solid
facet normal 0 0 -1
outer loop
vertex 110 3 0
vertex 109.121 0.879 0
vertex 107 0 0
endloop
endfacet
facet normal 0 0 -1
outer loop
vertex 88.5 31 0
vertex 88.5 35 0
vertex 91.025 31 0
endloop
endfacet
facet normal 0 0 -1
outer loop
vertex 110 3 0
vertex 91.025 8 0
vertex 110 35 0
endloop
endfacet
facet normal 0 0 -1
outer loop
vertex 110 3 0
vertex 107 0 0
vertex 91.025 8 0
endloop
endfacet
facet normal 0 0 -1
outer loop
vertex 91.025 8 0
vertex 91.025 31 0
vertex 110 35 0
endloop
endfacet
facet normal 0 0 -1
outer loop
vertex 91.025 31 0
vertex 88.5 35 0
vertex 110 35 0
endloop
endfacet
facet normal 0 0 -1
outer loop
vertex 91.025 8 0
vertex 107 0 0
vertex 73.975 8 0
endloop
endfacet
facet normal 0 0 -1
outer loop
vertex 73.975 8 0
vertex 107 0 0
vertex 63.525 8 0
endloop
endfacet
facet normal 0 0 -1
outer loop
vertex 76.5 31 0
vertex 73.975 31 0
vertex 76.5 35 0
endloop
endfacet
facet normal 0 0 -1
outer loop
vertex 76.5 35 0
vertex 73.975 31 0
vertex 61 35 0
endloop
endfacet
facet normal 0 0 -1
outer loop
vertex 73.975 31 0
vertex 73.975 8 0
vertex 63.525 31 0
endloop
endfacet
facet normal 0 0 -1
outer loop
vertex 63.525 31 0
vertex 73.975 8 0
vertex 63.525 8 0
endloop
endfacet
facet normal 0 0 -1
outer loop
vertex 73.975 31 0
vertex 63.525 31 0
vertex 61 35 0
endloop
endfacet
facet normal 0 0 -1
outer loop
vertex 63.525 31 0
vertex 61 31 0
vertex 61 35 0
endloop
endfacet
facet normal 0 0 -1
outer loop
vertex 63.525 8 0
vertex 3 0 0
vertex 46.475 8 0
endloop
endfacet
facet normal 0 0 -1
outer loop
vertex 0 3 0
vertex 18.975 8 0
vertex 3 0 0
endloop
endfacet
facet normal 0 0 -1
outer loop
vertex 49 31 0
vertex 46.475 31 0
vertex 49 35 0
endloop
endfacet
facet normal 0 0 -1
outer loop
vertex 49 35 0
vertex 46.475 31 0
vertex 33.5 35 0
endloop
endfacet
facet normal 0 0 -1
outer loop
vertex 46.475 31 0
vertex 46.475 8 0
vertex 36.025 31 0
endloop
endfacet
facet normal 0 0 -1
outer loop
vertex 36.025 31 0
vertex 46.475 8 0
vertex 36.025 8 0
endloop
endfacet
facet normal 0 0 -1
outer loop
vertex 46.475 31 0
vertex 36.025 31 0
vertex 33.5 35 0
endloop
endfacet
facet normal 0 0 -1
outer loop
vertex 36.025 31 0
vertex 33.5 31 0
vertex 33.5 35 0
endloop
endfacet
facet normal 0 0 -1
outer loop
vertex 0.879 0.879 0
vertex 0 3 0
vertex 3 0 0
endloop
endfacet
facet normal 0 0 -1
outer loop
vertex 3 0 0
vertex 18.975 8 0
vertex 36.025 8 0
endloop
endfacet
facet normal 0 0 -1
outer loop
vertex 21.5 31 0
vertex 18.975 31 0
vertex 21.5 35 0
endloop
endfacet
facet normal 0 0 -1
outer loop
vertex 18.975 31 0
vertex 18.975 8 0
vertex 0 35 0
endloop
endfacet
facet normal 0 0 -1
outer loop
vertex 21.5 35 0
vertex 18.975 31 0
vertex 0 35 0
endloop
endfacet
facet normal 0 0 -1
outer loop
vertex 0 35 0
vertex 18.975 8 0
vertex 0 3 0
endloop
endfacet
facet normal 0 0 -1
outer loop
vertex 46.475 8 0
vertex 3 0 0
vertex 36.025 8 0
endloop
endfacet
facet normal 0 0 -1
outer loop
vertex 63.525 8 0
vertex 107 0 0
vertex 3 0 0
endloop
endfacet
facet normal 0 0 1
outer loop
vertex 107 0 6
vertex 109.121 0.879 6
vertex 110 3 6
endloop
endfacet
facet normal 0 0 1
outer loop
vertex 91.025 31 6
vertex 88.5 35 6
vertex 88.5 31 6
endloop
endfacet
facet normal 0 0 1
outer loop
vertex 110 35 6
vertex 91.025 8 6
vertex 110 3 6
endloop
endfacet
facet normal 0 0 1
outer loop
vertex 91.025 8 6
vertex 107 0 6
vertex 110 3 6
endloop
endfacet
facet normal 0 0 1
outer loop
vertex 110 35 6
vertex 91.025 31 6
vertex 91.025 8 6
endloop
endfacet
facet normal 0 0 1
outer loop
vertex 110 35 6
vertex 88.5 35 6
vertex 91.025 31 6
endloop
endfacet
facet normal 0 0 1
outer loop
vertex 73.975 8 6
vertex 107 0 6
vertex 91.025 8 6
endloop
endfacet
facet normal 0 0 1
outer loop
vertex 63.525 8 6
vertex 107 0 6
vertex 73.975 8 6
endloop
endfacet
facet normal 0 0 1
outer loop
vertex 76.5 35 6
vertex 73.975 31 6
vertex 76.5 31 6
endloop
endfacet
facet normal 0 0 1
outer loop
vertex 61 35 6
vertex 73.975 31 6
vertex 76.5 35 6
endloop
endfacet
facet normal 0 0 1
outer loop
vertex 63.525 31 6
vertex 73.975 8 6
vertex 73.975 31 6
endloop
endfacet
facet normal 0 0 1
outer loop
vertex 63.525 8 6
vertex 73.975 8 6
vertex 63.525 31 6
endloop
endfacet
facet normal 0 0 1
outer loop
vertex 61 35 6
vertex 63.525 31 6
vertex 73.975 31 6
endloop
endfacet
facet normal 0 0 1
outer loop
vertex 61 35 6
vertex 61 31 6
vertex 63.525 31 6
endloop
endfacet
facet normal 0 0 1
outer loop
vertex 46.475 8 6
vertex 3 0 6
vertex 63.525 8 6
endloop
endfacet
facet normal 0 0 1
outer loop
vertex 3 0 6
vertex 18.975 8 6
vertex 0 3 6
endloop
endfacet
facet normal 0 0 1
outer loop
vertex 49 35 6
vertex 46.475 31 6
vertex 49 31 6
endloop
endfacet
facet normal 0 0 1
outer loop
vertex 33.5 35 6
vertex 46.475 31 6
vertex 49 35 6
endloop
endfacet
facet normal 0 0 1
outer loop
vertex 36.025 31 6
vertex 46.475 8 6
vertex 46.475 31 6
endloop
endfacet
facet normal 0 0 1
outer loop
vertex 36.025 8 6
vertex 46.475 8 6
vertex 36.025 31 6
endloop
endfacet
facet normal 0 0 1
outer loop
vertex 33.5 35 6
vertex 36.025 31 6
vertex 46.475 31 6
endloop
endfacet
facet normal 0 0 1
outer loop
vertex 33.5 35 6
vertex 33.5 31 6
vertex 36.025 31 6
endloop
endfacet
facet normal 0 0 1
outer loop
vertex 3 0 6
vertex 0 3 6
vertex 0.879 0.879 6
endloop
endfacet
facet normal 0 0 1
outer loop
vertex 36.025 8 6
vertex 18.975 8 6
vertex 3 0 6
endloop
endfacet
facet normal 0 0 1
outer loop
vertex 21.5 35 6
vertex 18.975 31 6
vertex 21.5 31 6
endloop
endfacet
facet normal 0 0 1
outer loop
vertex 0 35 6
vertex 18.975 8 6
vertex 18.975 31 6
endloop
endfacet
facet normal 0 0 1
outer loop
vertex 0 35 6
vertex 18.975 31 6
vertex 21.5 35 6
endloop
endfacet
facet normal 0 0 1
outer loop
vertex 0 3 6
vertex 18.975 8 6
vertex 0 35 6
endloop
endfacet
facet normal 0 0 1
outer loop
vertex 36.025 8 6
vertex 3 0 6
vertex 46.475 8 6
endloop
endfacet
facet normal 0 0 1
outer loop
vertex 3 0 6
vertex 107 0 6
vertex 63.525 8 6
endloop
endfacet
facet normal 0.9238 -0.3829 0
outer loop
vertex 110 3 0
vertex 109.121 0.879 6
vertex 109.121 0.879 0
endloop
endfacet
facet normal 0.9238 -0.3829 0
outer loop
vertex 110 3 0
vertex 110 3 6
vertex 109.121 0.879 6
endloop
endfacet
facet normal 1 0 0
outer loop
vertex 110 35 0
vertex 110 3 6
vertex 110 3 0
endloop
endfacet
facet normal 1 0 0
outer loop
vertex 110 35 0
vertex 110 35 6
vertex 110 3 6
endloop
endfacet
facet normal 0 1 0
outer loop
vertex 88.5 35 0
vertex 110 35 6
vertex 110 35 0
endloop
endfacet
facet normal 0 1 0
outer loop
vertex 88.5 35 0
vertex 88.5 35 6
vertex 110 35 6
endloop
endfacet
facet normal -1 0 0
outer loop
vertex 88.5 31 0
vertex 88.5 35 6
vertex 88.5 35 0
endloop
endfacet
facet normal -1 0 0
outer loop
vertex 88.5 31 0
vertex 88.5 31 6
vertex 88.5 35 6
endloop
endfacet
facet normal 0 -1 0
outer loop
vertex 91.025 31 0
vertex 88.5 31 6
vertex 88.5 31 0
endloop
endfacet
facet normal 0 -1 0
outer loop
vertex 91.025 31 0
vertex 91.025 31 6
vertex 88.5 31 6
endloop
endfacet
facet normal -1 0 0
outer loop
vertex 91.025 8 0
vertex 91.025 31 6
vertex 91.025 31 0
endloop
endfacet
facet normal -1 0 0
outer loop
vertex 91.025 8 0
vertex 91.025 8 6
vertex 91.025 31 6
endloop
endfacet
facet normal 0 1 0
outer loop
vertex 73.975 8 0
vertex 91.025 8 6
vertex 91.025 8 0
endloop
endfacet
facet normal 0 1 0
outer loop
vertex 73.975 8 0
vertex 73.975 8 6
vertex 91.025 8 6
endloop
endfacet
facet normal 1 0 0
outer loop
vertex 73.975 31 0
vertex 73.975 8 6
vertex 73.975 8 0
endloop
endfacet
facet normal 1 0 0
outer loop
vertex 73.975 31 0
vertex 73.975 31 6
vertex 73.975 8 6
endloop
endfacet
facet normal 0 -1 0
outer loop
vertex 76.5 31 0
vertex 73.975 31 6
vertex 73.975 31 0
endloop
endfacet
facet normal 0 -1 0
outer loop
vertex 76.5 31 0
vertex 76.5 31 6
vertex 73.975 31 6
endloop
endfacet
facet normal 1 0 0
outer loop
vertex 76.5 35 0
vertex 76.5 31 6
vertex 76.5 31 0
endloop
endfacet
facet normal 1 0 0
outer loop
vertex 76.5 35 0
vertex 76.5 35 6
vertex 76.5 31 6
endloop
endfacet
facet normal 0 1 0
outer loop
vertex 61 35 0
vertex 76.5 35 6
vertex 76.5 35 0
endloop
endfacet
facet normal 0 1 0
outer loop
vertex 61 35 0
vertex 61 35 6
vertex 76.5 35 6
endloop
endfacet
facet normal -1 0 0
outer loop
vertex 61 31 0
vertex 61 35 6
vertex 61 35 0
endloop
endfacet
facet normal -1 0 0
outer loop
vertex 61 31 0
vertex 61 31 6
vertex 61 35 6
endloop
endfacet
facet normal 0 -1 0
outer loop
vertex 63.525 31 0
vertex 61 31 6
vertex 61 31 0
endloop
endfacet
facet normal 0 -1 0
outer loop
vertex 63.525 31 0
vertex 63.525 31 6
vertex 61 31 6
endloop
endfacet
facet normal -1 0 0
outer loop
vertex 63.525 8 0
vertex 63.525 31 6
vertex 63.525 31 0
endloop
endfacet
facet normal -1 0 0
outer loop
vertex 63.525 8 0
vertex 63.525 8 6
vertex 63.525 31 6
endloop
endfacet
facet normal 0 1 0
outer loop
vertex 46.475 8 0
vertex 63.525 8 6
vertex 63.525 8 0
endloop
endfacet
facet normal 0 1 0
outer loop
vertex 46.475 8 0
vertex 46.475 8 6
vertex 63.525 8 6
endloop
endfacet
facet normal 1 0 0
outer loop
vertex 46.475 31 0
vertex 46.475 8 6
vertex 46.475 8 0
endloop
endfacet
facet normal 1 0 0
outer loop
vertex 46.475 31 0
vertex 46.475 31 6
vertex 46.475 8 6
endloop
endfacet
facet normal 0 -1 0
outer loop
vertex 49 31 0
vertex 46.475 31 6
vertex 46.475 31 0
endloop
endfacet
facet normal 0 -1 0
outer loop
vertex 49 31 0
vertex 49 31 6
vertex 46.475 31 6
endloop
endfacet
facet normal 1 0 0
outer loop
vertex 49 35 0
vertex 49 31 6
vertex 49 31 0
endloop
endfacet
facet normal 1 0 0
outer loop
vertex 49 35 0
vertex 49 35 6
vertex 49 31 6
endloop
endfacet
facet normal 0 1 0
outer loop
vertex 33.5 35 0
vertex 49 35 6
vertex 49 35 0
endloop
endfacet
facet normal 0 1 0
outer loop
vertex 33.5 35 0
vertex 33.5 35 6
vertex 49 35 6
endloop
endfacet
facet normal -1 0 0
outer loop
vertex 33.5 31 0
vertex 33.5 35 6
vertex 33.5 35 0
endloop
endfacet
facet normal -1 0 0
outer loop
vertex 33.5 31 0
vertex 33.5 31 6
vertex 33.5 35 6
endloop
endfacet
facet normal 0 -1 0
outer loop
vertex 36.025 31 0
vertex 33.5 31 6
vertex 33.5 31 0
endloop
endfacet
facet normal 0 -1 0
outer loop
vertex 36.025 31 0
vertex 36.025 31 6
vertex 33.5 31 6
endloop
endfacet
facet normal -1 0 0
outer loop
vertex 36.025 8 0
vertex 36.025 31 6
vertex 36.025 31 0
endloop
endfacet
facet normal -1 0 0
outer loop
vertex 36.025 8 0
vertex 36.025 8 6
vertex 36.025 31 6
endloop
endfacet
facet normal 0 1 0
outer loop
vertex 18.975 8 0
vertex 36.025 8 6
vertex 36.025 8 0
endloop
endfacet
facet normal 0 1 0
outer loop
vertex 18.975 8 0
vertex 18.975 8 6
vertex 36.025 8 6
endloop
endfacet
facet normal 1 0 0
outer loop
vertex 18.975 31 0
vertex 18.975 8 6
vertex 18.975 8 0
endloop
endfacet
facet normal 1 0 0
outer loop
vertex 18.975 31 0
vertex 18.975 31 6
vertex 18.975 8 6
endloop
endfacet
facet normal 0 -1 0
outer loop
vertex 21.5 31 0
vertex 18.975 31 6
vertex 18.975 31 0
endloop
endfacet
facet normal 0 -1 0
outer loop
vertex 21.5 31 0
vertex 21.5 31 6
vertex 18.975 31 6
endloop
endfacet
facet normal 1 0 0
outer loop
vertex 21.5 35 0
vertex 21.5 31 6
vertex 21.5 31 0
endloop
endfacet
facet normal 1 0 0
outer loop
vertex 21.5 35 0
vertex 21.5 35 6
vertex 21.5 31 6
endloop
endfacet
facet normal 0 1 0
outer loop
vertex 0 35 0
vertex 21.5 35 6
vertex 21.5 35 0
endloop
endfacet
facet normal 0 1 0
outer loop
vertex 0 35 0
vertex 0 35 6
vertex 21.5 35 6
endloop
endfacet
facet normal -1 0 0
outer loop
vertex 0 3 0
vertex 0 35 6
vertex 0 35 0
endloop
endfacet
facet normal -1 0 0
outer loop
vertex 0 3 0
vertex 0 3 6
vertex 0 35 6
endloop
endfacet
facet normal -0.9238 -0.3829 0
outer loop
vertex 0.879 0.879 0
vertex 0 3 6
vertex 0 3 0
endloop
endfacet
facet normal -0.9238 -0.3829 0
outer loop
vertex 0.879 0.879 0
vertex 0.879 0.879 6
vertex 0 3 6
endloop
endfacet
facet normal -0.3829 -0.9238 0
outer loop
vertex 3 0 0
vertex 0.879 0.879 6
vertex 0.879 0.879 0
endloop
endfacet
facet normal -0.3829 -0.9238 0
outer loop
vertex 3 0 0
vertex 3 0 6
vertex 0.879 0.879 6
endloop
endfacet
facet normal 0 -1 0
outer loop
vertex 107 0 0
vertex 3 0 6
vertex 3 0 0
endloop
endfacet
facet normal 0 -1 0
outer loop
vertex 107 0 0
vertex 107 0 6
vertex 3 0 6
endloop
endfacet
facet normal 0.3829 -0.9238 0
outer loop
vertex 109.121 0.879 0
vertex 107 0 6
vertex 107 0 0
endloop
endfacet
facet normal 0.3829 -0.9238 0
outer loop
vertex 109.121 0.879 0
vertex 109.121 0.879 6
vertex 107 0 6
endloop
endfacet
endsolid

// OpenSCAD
$fn = 32;

// ----------------------------------------------------------------------
// Window plate: 110 x 35 mm, 3 open windows
// ----------------------------------------------------------------------

// --- parameters (mm) ---
profile_height = 6;       // extrusion height
profile_points = 32;      // points of the closed outline

profile = [[0, 3], [0.879, 0.879], [3, 0], [107, 0], [109.121, 0.879], [110, 3], [110, 35], [88.5, 35], [88.5, 31], [91.025, 31], [91.025, 8], [73.975, 8], [73.975, 31], [76.5, 31], [76.5, 35], [61, 35], [61, 31], [63.525, 31], [63.525, 8], [46.475, 8], [46.475, 31], [49, 31], [49, 35], [33.5, 35], [33.5, 31], [36.025, 31], [36.025, 8], [18.975, 8], [18.975, 31], [21.5, 31], [21.5, 35], [0, 35]];  // single closed polygon, 32 points, counter clockwise

// --- the one profile operation ---
linear_extrude(height = profile_height) polygon(points = profile);
